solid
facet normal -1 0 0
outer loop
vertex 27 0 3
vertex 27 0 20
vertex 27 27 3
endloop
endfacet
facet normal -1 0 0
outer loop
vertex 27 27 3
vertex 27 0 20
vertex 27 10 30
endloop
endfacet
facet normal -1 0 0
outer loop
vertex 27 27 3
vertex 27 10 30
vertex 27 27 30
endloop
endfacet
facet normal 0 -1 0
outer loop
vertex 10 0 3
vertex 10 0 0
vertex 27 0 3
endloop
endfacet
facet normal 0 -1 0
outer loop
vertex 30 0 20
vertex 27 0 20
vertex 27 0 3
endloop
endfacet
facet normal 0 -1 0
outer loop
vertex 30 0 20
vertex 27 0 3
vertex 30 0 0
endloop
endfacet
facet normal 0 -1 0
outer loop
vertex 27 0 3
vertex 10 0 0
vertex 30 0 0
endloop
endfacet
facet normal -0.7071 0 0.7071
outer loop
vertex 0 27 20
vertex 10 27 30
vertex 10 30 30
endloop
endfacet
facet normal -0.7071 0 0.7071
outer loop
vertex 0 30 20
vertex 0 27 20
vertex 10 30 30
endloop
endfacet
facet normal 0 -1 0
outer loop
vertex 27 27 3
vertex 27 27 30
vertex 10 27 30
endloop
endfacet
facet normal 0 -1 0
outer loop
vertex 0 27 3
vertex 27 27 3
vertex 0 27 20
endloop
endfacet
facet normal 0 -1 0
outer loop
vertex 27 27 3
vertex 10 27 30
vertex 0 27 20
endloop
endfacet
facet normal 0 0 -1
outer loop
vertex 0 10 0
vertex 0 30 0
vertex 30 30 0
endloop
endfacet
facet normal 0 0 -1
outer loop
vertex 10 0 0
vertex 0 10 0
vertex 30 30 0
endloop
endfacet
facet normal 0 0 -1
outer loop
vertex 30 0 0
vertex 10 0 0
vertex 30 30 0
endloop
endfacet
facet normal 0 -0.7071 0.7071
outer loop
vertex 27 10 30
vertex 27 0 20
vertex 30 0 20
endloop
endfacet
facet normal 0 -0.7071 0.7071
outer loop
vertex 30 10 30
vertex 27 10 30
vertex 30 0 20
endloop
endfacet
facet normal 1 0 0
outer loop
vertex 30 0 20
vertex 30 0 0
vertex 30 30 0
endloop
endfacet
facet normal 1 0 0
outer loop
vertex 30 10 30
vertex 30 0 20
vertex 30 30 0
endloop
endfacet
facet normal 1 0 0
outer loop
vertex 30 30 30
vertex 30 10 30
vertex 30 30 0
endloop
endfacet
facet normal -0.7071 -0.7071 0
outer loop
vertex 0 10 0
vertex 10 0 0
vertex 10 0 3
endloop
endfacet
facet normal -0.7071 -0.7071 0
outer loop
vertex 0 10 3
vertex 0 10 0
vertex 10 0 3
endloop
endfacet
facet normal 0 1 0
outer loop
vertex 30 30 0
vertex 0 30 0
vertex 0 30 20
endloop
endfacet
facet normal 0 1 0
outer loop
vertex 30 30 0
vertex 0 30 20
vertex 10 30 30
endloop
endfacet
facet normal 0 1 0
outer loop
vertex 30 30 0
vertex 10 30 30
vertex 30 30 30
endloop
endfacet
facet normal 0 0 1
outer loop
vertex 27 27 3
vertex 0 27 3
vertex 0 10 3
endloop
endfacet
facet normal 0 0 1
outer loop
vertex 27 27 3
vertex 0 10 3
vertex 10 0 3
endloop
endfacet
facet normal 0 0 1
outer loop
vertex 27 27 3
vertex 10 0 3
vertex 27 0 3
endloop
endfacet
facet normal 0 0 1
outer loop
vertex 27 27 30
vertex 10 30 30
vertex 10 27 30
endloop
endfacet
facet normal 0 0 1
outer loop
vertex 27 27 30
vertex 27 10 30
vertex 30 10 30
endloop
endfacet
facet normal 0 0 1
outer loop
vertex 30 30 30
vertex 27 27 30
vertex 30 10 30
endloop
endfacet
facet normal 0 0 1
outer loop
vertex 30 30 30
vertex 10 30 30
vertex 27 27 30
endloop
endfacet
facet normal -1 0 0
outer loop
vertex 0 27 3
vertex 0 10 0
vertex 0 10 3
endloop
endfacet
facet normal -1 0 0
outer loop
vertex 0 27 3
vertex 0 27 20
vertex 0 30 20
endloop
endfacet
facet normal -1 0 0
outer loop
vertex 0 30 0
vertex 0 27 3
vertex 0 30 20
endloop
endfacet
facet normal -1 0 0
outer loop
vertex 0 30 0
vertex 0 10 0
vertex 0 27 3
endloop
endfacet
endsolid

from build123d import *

# Parameters (mm, degrees)
F0_W     = 30
F0_H     = 30
F1_DEPTH = 30
F2_SIZE  = 10
F3_SIZE  = 10
F5_DEPTH = 27


with BuildPart() as f1:
    # F0 (on Top) → F1 (new body)
    with BuildSketch(Plane.XY):
        with Locations((15, 15)):
            Rectangle(F0_W, F0_H)
    extrude(amount=F1_DEPTH)

    # F2
    f2_edges = [f1.edges().sort_by_distance(p)[0] for p in [
        (0, 0, 15),
    ]]
    chamfer(f2_edges, length=F2_SIZE)

    # F3
    f3_edges = [f1.edges().sort_by_distance(p)[0] for p in [
        (20, 0, 30),
        (5, 5, 30),
        (0, 20, 30),
    ]]
    chamfer(f3_edges, length=F3_SIZE)

    # F4 (on face) → F5 (cut)
    with BuildSketch(Plane.XY.offset(30)):
        with BuildLine():
            Line((27, 27), (0, 27))
            ThreePointArc((0, 27), (-6.8211951152, -6.8211951152), (27, 0))
            Line((27, 0), (27, 27))
        make_face()
    extrude(amount=-F5_DEPTH, mode=Mode.SUBTRACT)


solid = f1.part
